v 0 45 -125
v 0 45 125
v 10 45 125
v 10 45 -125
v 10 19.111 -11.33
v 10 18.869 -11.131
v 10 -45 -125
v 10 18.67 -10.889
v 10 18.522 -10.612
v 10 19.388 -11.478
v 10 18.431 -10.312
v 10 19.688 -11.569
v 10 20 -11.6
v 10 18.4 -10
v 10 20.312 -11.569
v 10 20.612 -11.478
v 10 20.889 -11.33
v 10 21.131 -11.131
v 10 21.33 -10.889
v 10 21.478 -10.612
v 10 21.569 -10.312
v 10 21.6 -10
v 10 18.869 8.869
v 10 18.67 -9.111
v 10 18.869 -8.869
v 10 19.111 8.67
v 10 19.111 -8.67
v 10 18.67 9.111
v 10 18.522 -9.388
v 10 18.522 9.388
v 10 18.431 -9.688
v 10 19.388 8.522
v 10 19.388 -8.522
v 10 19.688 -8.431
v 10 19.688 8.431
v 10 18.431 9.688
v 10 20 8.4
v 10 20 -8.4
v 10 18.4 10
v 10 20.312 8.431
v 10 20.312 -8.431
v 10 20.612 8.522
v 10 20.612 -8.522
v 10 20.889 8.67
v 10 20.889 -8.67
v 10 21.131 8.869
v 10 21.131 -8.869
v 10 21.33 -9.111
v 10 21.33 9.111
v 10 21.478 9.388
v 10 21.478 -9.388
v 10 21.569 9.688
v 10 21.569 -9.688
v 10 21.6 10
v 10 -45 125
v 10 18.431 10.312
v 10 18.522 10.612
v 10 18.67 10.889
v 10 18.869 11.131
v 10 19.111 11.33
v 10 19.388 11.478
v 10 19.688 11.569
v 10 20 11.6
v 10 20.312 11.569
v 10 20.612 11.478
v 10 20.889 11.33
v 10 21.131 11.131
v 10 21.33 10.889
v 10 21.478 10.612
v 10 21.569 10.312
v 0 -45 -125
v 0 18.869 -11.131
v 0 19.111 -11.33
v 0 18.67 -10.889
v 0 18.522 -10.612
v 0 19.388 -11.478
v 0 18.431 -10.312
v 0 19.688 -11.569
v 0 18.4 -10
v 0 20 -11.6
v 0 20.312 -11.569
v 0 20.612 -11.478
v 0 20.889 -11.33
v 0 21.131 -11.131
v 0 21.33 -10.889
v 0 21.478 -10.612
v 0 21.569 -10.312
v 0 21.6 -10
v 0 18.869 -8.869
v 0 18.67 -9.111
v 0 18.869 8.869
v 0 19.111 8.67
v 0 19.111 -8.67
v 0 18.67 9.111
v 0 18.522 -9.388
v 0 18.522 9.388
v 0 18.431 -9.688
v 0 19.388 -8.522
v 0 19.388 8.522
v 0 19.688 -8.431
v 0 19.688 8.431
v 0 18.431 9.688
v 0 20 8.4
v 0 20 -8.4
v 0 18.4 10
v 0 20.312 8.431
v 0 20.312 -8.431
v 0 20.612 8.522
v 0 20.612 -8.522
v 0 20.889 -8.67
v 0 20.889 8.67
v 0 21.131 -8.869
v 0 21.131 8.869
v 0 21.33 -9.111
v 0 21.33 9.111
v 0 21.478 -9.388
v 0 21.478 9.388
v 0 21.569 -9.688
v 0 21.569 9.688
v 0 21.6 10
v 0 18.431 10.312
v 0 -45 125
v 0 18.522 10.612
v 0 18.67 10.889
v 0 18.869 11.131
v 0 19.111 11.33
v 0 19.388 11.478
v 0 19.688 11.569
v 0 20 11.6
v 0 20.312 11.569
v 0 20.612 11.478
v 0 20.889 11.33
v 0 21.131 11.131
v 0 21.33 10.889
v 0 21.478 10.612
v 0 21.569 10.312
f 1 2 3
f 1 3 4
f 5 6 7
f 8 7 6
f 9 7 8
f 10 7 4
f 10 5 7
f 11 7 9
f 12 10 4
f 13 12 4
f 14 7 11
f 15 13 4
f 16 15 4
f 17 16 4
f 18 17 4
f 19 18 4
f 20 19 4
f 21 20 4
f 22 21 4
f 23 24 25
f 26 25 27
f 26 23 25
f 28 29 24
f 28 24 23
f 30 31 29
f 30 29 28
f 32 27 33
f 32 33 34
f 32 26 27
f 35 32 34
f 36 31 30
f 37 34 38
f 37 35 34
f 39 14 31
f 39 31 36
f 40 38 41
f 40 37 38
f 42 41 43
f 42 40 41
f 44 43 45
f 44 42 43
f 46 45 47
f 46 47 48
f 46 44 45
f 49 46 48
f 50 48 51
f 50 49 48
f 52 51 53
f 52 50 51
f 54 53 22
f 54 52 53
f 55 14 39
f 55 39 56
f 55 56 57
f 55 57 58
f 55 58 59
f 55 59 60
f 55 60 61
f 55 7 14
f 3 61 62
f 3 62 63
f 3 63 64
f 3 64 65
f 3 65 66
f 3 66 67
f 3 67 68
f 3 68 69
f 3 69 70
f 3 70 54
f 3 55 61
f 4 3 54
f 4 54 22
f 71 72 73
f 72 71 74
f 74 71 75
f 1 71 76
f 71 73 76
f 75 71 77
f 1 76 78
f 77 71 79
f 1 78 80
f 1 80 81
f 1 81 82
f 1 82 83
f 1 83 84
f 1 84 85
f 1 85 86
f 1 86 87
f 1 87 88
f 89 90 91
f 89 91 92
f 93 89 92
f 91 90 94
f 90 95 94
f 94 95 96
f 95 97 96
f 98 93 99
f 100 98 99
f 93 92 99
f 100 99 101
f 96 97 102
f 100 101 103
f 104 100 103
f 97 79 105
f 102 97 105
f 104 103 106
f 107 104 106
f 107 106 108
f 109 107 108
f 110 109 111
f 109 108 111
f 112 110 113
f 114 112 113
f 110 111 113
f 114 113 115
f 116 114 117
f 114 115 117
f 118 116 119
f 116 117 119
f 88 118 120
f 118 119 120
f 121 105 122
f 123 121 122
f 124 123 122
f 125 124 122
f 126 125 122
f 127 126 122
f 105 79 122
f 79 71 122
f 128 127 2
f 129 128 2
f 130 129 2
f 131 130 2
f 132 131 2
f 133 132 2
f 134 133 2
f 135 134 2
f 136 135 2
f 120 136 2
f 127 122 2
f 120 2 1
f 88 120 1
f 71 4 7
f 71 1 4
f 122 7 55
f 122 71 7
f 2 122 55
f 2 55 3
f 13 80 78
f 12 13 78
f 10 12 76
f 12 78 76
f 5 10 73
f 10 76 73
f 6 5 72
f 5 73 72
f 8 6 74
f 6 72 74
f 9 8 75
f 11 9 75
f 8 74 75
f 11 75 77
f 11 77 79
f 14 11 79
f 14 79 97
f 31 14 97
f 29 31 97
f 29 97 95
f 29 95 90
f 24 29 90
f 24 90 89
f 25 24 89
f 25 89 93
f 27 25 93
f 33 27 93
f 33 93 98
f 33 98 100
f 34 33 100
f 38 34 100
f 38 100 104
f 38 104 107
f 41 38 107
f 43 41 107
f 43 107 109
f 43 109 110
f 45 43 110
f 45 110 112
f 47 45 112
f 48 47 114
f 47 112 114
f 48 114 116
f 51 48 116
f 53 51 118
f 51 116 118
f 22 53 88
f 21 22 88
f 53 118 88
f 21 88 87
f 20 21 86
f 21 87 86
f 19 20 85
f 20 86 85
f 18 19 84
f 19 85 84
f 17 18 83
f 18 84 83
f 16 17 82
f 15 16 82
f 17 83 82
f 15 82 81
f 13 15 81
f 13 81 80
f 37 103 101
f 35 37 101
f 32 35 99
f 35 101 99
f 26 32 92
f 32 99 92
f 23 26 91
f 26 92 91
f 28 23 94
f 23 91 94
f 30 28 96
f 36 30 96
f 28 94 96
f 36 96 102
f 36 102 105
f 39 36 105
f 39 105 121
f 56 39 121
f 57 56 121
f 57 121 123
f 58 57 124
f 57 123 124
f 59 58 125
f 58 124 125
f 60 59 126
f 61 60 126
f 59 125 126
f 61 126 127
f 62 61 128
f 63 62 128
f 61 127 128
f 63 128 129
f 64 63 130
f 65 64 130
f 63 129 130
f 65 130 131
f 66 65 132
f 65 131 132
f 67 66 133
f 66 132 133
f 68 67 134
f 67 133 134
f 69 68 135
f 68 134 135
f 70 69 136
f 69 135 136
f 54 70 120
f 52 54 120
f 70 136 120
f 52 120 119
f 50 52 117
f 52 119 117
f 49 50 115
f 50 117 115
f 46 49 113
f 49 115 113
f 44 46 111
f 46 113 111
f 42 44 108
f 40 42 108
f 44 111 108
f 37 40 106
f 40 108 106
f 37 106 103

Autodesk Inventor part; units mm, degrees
ref_plane "YZ Plane" through (0, 0, 0) normal (1, 0, 0) x (0, 1, 0)
ref_plane "XZ Plane" through (0, 0, 0) normal (0, 1, 0) x (-1, 0, 0)
ref_plane "XY Plane" through (0, 0, 0) normal (0, 0, 1) x (1, 0, 0)
sketch "Sketch1" plane through (0, 0, 0) normal (1, 0, 0) x (0, 1, 0)
  line L0 (-45, 125) -> (45, 125)
  line L1 (45, 125) -> (45, -125)
  line L2 (45, -125) -> (-45, -125)
  line L3 (-45, -125) -> (-45, 125)
  line L4 (-45, 125) -> (45, -125) construction
  line L5 (45, 125) -> (-45, -125) construction
  point P0 (0, 0)
  dimension "d0" = 250
  dimension "d1" = 90
extrude "Extrusion1" add sketch "Sketch1" along normal blind 10
sketch "Sketch2" plane through (10, 0, 0) normal (1, 0, 0) x (0, 0, -1)
  line L0 (125, -45) -> (125, 45) projected
  line L1 (125, 45) -> (-125, 45) projected
  line L2 (-125, 45) -> (-125, -45) projected
  line L3 (-125, -45) -> (125, -45) projected
  line L4 (0, 45) -> (0, 20)
  line L5 (-10, 20) -> (10, 20)
  point P0 (0, 0)
  dimension "d4" = 20
  dimension "d5" = 25
hole "Hole1" at (10, 20, 10) at (10, 20, -10) direction (-1, 0, 0) diameter 3.2 end through all
properties part number "09_Tam_canh_top_bottom"
